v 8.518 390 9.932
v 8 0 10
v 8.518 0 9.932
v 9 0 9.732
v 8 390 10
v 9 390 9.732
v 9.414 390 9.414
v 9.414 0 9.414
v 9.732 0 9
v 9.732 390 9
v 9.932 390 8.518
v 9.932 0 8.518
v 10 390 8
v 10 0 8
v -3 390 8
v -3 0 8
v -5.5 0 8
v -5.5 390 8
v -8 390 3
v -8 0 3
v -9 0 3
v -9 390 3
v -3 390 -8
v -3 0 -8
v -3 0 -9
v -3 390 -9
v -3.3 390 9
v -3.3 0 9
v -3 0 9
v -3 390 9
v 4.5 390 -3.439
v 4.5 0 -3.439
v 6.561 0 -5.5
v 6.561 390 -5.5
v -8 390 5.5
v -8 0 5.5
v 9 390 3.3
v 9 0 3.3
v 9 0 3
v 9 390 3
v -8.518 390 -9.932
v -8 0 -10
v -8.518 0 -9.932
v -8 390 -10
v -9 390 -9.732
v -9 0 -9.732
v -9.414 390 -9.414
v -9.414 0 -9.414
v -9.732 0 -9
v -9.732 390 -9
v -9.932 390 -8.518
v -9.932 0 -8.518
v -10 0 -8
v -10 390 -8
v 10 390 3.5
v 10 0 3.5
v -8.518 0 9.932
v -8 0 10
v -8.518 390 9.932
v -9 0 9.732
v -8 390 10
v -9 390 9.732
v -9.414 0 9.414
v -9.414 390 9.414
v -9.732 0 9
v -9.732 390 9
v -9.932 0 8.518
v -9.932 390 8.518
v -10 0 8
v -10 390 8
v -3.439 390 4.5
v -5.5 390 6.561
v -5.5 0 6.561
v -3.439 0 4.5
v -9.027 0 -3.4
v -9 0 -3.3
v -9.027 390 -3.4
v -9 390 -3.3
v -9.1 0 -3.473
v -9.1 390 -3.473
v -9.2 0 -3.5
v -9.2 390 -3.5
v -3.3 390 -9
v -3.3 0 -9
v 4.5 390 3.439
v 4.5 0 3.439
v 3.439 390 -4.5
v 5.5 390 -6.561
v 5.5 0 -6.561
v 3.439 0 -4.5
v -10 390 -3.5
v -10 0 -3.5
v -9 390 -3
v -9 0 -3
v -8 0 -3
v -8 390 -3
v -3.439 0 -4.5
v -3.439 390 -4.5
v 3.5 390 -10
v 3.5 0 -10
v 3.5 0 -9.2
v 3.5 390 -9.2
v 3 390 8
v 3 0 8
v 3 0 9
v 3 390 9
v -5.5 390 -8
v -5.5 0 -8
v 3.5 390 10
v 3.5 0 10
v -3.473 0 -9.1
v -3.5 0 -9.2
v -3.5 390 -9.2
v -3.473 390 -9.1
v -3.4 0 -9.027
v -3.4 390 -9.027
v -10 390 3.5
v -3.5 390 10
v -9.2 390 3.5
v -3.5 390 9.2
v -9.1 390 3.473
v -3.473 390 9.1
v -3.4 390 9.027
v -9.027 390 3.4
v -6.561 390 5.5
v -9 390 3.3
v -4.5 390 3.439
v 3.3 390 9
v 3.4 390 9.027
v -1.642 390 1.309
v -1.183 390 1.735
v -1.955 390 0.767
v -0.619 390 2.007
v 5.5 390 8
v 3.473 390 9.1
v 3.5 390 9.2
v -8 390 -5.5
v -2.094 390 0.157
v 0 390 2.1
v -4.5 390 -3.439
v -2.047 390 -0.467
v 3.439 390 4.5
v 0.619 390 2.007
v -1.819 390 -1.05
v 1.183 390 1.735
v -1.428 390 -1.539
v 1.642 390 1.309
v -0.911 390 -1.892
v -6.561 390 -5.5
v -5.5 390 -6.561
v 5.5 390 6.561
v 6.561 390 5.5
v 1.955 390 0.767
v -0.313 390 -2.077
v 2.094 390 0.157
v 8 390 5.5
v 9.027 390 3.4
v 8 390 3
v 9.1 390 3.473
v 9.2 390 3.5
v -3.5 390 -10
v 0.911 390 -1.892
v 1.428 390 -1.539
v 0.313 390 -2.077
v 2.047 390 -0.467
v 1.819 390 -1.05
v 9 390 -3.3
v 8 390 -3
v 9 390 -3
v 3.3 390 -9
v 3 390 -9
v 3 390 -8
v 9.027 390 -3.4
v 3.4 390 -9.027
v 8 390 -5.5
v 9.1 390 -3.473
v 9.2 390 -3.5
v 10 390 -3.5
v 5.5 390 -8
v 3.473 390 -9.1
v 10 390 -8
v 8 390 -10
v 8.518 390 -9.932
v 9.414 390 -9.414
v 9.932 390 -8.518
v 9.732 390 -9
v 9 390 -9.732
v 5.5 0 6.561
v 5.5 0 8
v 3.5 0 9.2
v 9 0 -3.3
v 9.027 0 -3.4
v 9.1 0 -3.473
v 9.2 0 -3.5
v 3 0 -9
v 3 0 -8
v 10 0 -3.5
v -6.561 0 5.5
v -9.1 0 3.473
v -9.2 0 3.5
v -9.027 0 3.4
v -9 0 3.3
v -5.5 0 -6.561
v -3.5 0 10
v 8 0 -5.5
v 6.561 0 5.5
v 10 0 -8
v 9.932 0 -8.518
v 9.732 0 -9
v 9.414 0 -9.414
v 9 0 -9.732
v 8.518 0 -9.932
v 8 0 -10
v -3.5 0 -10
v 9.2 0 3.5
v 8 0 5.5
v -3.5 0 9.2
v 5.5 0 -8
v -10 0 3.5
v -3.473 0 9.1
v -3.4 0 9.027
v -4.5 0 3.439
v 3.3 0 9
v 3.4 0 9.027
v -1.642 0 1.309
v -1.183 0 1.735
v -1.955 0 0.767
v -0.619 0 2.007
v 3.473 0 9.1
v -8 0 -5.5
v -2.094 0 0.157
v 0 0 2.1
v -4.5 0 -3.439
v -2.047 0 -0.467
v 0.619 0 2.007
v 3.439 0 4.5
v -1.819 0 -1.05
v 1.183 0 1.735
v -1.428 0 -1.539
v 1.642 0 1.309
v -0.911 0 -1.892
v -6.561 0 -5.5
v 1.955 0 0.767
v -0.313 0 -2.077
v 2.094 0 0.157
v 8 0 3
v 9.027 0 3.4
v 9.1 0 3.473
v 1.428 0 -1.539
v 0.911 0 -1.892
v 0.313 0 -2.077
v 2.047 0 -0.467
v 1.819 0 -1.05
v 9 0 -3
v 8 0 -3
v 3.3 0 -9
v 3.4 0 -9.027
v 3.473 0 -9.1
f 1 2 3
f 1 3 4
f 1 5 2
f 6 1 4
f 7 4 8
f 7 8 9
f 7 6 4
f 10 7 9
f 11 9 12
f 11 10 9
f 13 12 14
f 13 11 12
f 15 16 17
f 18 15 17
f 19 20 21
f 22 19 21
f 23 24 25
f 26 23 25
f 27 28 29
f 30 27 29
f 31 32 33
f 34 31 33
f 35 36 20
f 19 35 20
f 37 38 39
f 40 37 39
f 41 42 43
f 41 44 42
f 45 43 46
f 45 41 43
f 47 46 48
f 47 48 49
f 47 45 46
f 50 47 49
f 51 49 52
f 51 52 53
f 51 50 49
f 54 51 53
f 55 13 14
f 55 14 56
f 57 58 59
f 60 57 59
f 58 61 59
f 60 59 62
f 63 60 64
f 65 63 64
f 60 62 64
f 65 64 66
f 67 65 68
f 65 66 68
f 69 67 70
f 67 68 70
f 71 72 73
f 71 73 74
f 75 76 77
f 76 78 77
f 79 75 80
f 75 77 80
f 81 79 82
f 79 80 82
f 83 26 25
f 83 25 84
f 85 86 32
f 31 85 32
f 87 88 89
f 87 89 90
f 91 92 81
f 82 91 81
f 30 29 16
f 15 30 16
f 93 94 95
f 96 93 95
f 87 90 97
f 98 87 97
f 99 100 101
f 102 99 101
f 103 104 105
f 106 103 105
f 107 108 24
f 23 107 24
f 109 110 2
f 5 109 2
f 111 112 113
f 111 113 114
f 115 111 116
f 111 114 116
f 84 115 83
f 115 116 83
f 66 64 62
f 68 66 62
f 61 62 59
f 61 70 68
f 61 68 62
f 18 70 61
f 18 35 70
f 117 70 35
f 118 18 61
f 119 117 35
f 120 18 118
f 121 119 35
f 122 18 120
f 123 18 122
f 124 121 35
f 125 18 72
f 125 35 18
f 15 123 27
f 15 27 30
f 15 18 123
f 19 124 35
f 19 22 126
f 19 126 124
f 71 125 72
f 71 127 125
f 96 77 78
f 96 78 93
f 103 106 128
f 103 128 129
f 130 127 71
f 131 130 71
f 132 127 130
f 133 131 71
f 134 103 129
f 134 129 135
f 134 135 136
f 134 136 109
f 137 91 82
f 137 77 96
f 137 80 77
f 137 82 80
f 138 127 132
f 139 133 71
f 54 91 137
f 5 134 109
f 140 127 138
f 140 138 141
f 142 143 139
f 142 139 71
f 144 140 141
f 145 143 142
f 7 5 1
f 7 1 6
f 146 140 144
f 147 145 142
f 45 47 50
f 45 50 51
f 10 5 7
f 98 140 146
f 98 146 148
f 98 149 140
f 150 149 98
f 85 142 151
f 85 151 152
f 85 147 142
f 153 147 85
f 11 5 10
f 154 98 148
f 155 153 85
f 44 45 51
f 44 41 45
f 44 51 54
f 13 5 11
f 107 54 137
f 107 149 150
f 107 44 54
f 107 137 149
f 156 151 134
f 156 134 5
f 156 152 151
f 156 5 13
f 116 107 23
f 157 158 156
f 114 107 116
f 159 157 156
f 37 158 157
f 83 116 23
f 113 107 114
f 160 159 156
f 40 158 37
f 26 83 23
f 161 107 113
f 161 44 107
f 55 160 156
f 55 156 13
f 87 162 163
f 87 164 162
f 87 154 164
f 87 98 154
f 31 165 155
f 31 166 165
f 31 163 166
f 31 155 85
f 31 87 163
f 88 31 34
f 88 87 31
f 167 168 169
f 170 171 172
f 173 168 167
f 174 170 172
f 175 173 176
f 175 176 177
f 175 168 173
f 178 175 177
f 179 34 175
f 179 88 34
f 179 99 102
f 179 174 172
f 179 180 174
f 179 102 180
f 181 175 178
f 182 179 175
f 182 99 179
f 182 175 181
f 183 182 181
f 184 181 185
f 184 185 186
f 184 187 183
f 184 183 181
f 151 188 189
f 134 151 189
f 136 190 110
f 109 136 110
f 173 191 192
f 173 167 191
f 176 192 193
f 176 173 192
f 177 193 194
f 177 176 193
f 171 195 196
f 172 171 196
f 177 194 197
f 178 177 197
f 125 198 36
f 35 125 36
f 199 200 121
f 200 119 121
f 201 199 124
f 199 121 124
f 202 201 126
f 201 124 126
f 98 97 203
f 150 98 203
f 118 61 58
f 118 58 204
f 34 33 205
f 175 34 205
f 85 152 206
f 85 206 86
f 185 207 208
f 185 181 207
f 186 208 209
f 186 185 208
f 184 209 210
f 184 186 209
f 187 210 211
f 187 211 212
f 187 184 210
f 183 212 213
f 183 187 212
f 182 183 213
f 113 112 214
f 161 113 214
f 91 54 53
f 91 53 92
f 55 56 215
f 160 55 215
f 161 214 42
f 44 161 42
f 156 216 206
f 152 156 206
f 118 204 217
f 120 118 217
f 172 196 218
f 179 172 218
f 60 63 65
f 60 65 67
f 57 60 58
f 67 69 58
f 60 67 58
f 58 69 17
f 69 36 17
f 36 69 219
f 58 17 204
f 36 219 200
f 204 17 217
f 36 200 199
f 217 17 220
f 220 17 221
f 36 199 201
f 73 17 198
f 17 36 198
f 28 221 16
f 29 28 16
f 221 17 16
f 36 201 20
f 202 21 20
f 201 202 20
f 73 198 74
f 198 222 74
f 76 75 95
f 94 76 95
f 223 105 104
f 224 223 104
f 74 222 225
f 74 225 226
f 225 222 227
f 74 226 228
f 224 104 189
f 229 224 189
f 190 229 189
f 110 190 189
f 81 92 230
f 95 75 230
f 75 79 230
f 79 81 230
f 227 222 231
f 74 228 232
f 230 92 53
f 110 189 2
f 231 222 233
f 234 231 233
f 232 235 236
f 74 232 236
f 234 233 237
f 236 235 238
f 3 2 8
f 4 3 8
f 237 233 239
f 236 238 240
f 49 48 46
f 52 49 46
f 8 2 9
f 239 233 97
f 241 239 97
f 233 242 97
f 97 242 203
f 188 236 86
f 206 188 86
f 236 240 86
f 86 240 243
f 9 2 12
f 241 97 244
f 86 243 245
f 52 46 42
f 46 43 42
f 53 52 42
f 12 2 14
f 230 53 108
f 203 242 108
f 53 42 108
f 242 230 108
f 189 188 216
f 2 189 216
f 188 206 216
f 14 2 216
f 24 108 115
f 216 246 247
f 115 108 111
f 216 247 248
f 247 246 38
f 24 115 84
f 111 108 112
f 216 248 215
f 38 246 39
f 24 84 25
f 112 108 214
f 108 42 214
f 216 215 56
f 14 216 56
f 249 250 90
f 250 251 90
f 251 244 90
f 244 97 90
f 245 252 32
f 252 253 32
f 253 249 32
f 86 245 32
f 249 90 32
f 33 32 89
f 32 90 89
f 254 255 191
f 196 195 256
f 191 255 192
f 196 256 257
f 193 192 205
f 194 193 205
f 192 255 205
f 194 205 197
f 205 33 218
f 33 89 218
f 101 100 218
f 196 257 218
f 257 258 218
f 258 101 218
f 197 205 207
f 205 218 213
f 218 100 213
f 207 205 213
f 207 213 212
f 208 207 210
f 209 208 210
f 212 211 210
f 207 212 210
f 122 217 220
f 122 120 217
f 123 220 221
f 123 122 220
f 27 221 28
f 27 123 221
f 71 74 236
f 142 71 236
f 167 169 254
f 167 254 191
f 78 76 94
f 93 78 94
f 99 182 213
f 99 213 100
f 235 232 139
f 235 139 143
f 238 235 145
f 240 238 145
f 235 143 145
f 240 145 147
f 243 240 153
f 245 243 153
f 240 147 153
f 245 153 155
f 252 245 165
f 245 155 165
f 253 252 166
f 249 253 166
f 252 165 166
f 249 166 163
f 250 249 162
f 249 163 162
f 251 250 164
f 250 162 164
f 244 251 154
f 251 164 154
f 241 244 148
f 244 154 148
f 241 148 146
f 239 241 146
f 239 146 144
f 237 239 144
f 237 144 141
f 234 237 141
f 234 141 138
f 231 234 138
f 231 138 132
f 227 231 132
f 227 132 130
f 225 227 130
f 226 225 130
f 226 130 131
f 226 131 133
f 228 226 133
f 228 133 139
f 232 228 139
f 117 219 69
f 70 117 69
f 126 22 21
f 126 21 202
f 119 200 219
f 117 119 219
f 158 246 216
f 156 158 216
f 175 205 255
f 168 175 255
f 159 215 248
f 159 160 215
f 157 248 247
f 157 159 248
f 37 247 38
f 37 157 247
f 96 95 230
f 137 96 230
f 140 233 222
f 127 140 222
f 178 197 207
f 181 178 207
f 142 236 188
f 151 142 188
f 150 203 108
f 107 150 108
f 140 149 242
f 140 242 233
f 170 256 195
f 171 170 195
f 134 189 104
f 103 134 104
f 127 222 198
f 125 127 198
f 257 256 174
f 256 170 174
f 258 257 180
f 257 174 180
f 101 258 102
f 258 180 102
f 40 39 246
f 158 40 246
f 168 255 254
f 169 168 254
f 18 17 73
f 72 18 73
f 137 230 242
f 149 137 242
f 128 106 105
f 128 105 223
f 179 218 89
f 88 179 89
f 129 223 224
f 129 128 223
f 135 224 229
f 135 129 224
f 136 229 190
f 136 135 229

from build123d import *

# Parameters (mm, degrees)
EXTRUDE_1_DEPTH     = 390
FILLET_1_R          = 2
FILLET_2_R          = 0.2
SKETCH_4_R          = 2.1
CUT_EXTRUDE_1_DEPTH = 391.256326022


with BuildPart() as part:
    # Эскиз3 → Бобышка-Вытянуть1 (new body)
    with BuildSketch(Plane(origin=(0, 0, 0), x_dir=(1, 0, 0), z_dir=(0, 1, 0))):
        Polygon((-10, -10), (-3.5, -10), (-3.5, -9), (-3, -9), (-3, -8), (-5.5, -8), (-5.5, -6.560660172), (-3.439339828, -4.5), (3.439339828, -4.5), (5.5, -6.560660172), (5.5, -8), (3, -8), (3, -9), (3.5, -9), (3.5, -10), (10, -10), (10, -3.5), (9, -3.5), (9, -3), (8, -3), (8, -5.5), (6.560660172, -5.5), (4.5, -3.439339828), (4.5, 3.439339828), (6.560660172, 5.5), (8, 5.5), (8, 3), (9, 3), (9, 3.5), (10, 3.5), (10, 10), (3.5, 10), (3.5, 9), (3, 9), (3, 8), (5.5, 8), (5.5, 6.560660172), (3.439339828, 4.5), (-3.439339828, 4.5), (-5.5, 6.560660172), (-5.5, 8), (-3, 8), (-3, 9), (-3.5, 9), (-3.5, 10), (-10, 10), (-10, 3.5), (-9, 3.5), (-9, 3), (-8, 3), (-8, 5.5), (-6.560660172, 5.5), (-4.5, 3.439339828), (-4.5, -3.439339828), (-6.560660172, -5.5), (-8, -5.5), (-8, -3), (-9, -3), (-9, -3.5), (-10, -3.5), align=None)
    extrude(amount=EXTRUDE_1_DEPTH)

    # Скругление1
    fillet_1_edges = [part.edges().sort_by_distance(p)[0] for p in [
        (-10, 195, 10),
        (-10, 195, -10),
        (10, 195, -10),
        (10, 195, 10),
    ]]
    fillet(fillet_1_edges, radius=FILLET_1_R)

    # Скругление2
    fillet_2_edges = [part.edges().sort_by_distance(p)[0] for p in [
        (-3.5, 195, 9),
        (-9, 195, 3.5),
        (-9, 195, -3.5),
        (-3.5, 195, -9),
        (3.5, 195, -9),
        (9, 195, -3.5),
        (9, 195, 3.5),
        (3.5, 195, 9),
    ]]
    fillet(fillet_2_edges, radius=FILLET_2_R)

    # Эскиз4 → Вырез-Вытянуть1 (cut, through all)
    with BuildSketch(Plane(origin=(0, 390, 0), x_dir=(1, 0, 0), z_dir=(0, 1, 0))):
        with Locations(Location((0, 0, 0), (0, 0, 270))):
            Circle(SKETCH_4_R)
    extrude(amount=-CUT_EXTRUDE_1_DEPTH, mode=Mode.SUBTRACT)


solid = part.part
